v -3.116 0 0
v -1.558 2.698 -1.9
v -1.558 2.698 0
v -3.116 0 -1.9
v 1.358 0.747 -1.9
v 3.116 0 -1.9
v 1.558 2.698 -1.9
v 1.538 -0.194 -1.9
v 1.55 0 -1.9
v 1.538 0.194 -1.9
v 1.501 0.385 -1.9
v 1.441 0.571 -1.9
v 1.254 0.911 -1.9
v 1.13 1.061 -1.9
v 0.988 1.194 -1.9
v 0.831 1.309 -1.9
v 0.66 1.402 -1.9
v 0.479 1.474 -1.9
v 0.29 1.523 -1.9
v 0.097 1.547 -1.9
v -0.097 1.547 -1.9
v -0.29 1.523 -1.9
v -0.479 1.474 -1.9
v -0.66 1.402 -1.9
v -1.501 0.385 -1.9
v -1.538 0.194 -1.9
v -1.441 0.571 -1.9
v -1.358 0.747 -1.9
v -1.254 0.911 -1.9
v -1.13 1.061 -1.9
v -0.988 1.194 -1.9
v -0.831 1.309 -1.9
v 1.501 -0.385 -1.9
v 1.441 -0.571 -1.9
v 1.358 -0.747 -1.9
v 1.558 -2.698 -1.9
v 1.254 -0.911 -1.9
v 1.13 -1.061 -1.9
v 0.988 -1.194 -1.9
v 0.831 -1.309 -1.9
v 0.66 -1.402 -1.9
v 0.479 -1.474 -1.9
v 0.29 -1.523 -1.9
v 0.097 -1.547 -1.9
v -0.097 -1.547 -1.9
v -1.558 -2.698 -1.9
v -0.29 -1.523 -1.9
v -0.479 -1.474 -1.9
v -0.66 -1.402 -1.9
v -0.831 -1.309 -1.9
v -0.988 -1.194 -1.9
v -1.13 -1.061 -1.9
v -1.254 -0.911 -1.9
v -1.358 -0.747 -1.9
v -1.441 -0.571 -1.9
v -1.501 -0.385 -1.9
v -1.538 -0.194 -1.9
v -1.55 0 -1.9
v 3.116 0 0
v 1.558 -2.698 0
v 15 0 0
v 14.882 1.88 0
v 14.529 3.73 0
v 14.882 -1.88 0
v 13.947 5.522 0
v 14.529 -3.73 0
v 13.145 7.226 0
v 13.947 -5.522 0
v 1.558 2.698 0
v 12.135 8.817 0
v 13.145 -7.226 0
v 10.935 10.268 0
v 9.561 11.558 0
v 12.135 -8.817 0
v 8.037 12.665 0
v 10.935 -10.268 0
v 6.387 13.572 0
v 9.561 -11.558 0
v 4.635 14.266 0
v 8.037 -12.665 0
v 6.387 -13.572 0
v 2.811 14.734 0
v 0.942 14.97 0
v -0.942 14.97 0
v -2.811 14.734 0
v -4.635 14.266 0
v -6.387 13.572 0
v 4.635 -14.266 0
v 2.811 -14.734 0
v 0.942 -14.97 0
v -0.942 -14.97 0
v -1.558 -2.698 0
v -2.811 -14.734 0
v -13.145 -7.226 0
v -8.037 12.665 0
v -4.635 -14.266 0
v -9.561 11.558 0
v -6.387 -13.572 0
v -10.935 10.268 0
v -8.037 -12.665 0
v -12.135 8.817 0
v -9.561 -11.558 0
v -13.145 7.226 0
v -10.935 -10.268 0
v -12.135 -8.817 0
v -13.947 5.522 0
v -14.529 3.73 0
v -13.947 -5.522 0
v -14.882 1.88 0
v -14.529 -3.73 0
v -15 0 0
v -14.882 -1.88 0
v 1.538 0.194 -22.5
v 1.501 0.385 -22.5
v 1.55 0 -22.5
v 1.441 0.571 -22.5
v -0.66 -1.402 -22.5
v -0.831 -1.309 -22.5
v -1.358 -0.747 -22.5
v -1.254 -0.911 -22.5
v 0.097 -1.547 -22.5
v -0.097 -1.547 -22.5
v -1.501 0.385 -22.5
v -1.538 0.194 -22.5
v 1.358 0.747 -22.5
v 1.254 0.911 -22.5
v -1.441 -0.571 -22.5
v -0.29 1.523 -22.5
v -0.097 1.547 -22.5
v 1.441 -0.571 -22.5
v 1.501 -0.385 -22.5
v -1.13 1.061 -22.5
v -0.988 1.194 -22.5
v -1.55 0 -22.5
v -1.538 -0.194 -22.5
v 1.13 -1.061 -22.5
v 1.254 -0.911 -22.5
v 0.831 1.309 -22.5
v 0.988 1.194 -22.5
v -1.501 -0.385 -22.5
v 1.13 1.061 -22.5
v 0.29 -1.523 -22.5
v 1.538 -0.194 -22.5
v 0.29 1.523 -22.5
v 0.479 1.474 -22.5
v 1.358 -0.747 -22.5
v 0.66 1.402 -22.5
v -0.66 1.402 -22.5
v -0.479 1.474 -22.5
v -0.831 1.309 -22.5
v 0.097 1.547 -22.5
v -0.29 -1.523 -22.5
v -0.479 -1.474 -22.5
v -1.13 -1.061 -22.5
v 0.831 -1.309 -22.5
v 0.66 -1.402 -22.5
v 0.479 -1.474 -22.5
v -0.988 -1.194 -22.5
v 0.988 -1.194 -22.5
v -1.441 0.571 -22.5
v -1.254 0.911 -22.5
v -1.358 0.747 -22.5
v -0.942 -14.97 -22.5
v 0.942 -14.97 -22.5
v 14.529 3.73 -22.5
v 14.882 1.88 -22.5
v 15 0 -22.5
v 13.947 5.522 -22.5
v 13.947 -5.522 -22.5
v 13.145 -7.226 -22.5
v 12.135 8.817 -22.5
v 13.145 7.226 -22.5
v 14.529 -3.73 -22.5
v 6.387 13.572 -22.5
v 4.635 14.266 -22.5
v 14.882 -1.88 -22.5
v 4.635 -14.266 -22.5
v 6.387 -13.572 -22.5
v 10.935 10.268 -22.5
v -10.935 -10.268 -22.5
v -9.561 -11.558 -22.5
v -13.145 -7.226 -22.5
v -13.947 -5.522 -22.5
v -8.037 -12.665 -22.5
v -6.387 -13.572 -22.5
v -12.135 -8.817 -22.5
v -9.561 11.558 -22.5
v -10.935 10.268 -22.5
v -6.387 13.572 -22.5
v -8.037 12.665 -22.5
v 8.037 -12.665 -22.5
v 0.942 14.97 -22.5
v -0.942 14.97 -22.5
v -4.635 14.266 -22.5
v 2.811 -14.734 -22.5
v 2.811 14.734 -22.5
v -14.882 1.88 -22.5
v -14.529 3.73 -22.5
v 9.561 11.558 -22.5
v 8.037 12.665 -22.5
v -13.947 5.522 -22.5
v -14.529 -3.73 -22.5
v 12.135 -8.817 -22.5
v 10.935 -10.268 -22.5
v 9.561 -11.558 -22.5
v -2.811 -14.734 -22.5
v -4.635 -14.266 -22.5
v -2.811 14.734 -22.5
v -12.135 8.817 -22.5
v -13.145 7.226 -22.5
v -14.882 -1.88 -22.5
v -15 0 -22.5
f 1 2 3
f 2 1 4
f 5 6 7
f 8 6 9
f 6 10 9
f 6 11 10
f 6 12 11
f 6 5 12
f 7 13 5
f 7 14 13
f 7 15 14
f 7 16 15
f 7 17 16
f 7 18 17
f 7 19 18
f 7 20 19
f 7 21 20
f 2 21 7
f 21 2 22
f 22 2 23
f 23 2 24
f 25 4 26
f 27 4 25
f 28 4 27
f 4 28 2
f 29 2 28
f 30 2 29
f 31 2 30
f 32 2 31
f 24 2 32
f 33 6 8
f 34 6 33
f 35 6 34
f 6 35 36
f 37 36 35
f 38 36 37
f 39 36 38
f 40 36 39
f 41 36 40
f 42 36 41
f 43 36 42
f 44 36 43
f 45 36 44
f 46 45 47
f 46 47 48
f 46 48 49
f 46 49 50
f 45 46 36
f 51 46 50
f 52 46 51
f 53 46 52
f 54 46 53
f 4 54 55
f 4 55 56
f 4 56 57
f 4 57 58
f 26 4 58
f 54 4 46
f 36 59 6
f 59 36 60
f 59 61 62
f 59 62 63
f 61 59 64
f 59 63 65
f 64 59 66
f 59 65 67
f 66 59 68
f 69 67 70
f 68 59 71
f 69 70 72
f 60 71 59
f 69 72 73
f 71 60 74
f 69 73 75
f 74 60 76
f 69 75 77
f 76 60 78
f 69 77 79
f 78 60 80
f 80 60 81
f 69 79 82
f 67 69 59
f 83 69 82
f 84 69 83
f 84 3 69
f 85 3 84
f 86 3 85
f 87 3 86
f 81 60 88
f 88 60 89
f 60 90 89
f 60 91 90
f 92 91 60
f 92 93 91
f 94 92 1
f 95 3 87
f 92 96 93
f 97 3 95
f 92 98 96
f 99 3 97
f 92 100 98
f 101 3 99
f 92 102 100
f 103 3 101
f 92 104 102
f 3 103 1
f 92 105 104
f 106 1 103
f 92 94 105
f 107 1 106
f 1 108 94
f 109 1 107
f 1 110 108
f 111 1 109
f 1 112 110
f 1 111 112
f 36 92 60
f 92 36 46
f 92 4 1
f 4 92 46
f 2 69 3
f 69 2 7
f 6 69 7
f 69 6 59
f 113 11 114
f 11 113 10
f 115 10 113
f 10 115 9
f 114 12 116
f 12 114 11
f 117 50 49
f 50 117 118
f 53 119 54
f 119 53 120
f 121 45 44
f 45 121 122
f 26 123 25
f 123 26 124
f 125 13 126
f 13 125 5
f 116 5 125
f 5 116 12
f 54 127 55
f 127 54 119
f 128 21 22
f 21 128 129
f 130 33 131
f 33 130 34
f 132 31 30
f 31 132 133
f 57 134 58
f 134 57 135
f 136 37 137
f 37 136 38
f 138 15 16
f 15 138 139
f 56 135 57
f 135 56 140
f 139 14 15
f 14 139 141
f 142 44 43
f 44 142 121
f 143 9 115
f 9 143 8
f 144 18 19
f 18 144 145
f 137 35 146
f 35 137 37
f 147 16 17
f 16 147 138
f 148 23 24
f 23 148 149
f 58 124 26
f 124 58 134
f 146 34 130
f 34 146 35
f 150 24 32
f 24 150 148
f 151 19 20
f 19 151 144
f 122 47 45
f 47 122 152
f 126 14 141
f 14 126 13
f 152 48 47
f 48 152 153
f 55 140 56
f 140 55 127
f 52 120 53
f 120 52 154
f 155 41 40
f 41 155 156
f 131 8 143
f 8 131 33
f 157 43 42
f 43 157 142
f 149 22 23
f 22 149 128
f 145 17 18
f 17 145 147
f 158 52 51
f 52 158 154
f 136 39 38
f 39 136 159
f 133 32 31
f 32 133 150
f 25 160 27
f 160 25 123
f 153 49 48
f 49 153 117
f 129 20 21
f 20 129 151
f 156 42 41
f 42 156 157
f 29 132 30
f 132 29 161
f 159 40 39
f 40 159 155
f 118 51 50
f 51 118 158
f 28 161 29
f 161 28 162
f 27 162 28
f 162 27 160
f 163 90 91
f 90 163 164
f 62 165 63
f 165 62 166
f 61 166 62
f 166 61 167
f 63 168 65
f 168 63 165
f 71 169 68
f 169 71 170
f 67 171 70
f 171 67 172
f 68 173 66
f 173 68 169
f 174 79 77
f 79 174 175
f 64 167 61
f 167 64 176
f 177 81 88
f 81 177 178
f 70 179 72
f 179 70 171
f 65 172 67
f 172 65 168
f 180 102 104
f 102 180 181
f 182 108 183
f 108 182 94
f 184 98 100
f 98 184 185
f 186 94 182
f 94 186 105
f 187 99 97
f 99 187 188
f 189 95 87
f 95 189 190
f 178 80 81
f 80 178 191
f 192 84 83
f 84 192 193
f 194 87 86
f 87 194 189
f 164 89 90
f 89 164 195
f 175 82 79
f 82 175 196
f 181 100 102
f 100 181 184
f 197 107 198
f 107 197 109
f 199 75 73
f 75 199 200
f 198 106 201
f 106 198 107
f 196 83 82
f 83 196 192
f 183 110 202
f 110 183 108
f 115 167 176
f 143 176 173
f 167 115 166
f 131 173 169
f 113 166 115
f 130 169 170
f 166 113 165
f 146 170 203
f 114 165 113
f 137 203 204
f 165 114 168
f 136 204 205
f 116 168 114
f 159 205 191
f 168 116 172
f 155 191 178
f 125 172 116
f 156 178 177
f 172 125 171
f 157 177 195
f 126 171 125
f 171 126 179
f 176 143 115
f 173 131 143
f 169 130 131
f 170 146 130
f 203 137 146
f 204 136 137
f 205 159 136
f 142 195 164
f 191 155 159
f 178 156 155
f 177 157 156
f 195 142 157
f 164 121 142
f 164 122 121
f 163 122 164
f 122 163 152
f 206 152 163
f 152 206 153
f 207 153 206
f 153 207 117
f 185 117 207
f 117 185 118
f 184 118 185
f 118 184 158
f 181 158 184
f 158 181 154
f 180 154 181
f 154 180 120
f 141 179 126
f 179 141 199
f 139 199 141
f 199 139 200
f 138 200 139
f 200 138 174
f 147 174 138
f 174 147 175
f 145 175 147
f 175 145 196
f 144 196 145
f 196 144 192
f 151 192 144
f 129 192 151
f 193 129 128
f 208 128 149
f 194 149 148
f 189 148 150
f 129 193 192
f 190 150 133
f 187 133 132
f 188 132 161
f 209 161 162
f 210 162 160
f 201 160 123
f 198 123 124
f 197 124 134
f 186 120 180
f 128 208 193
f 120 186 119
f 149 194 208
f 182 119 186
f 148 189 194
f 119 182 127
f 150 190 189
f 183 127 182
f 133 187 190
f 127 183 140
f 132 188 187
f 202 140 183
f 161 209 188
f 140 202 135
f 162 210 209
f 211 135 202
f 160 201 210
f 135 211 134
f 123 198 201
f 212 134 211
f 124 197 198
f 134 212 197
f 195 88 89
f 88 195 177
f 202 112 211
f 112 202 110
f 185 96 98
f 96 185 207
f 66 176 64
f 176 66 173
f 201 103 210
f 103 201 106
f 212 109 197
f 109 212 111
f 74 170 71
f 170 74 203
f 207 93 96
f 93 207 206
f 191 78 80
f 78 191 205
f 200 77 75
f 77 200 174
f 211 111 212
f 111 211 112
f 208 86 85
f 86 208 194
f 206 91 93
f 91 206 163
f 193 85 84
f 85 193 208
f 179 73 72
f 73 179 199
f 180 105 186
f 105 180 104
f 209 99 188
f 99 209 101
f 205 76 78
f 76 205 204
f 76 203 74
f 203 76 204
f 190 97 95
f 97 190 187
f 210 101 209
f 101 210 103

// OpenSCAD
$fn = 50;

difference() {
	union() {
		translate(v = [0, 0, -22.5]) {
			cylinder(h = 22.5, r = 15.0);
		}
	}
	union() {
		translate(v = [0, 0, 0]) {
			rotate(a = [0, 0, 0]) {
				difference() {
					union() {
						translate(v = [0, 0, -1.9]) {
							linear_extrude(height = 1.9) {
								polygon(points = [[3.1158, 0.0], [1.5579000000000005, 2.698361953111554], [-1.5578999999999994, 2.6983619531115544], [-3.1158, 3.815754496783323e-16], [-1.5579000000000014, -2.6983619531115535], [1.557899999999998, -2.6983619531115552]]);
							}
						}
					}
					union();
				}
			}
		}
		#translate(v = [0, 0, -100.0]) {
			cylinder(h = 200, r = 1.55);
		}
	}
}
